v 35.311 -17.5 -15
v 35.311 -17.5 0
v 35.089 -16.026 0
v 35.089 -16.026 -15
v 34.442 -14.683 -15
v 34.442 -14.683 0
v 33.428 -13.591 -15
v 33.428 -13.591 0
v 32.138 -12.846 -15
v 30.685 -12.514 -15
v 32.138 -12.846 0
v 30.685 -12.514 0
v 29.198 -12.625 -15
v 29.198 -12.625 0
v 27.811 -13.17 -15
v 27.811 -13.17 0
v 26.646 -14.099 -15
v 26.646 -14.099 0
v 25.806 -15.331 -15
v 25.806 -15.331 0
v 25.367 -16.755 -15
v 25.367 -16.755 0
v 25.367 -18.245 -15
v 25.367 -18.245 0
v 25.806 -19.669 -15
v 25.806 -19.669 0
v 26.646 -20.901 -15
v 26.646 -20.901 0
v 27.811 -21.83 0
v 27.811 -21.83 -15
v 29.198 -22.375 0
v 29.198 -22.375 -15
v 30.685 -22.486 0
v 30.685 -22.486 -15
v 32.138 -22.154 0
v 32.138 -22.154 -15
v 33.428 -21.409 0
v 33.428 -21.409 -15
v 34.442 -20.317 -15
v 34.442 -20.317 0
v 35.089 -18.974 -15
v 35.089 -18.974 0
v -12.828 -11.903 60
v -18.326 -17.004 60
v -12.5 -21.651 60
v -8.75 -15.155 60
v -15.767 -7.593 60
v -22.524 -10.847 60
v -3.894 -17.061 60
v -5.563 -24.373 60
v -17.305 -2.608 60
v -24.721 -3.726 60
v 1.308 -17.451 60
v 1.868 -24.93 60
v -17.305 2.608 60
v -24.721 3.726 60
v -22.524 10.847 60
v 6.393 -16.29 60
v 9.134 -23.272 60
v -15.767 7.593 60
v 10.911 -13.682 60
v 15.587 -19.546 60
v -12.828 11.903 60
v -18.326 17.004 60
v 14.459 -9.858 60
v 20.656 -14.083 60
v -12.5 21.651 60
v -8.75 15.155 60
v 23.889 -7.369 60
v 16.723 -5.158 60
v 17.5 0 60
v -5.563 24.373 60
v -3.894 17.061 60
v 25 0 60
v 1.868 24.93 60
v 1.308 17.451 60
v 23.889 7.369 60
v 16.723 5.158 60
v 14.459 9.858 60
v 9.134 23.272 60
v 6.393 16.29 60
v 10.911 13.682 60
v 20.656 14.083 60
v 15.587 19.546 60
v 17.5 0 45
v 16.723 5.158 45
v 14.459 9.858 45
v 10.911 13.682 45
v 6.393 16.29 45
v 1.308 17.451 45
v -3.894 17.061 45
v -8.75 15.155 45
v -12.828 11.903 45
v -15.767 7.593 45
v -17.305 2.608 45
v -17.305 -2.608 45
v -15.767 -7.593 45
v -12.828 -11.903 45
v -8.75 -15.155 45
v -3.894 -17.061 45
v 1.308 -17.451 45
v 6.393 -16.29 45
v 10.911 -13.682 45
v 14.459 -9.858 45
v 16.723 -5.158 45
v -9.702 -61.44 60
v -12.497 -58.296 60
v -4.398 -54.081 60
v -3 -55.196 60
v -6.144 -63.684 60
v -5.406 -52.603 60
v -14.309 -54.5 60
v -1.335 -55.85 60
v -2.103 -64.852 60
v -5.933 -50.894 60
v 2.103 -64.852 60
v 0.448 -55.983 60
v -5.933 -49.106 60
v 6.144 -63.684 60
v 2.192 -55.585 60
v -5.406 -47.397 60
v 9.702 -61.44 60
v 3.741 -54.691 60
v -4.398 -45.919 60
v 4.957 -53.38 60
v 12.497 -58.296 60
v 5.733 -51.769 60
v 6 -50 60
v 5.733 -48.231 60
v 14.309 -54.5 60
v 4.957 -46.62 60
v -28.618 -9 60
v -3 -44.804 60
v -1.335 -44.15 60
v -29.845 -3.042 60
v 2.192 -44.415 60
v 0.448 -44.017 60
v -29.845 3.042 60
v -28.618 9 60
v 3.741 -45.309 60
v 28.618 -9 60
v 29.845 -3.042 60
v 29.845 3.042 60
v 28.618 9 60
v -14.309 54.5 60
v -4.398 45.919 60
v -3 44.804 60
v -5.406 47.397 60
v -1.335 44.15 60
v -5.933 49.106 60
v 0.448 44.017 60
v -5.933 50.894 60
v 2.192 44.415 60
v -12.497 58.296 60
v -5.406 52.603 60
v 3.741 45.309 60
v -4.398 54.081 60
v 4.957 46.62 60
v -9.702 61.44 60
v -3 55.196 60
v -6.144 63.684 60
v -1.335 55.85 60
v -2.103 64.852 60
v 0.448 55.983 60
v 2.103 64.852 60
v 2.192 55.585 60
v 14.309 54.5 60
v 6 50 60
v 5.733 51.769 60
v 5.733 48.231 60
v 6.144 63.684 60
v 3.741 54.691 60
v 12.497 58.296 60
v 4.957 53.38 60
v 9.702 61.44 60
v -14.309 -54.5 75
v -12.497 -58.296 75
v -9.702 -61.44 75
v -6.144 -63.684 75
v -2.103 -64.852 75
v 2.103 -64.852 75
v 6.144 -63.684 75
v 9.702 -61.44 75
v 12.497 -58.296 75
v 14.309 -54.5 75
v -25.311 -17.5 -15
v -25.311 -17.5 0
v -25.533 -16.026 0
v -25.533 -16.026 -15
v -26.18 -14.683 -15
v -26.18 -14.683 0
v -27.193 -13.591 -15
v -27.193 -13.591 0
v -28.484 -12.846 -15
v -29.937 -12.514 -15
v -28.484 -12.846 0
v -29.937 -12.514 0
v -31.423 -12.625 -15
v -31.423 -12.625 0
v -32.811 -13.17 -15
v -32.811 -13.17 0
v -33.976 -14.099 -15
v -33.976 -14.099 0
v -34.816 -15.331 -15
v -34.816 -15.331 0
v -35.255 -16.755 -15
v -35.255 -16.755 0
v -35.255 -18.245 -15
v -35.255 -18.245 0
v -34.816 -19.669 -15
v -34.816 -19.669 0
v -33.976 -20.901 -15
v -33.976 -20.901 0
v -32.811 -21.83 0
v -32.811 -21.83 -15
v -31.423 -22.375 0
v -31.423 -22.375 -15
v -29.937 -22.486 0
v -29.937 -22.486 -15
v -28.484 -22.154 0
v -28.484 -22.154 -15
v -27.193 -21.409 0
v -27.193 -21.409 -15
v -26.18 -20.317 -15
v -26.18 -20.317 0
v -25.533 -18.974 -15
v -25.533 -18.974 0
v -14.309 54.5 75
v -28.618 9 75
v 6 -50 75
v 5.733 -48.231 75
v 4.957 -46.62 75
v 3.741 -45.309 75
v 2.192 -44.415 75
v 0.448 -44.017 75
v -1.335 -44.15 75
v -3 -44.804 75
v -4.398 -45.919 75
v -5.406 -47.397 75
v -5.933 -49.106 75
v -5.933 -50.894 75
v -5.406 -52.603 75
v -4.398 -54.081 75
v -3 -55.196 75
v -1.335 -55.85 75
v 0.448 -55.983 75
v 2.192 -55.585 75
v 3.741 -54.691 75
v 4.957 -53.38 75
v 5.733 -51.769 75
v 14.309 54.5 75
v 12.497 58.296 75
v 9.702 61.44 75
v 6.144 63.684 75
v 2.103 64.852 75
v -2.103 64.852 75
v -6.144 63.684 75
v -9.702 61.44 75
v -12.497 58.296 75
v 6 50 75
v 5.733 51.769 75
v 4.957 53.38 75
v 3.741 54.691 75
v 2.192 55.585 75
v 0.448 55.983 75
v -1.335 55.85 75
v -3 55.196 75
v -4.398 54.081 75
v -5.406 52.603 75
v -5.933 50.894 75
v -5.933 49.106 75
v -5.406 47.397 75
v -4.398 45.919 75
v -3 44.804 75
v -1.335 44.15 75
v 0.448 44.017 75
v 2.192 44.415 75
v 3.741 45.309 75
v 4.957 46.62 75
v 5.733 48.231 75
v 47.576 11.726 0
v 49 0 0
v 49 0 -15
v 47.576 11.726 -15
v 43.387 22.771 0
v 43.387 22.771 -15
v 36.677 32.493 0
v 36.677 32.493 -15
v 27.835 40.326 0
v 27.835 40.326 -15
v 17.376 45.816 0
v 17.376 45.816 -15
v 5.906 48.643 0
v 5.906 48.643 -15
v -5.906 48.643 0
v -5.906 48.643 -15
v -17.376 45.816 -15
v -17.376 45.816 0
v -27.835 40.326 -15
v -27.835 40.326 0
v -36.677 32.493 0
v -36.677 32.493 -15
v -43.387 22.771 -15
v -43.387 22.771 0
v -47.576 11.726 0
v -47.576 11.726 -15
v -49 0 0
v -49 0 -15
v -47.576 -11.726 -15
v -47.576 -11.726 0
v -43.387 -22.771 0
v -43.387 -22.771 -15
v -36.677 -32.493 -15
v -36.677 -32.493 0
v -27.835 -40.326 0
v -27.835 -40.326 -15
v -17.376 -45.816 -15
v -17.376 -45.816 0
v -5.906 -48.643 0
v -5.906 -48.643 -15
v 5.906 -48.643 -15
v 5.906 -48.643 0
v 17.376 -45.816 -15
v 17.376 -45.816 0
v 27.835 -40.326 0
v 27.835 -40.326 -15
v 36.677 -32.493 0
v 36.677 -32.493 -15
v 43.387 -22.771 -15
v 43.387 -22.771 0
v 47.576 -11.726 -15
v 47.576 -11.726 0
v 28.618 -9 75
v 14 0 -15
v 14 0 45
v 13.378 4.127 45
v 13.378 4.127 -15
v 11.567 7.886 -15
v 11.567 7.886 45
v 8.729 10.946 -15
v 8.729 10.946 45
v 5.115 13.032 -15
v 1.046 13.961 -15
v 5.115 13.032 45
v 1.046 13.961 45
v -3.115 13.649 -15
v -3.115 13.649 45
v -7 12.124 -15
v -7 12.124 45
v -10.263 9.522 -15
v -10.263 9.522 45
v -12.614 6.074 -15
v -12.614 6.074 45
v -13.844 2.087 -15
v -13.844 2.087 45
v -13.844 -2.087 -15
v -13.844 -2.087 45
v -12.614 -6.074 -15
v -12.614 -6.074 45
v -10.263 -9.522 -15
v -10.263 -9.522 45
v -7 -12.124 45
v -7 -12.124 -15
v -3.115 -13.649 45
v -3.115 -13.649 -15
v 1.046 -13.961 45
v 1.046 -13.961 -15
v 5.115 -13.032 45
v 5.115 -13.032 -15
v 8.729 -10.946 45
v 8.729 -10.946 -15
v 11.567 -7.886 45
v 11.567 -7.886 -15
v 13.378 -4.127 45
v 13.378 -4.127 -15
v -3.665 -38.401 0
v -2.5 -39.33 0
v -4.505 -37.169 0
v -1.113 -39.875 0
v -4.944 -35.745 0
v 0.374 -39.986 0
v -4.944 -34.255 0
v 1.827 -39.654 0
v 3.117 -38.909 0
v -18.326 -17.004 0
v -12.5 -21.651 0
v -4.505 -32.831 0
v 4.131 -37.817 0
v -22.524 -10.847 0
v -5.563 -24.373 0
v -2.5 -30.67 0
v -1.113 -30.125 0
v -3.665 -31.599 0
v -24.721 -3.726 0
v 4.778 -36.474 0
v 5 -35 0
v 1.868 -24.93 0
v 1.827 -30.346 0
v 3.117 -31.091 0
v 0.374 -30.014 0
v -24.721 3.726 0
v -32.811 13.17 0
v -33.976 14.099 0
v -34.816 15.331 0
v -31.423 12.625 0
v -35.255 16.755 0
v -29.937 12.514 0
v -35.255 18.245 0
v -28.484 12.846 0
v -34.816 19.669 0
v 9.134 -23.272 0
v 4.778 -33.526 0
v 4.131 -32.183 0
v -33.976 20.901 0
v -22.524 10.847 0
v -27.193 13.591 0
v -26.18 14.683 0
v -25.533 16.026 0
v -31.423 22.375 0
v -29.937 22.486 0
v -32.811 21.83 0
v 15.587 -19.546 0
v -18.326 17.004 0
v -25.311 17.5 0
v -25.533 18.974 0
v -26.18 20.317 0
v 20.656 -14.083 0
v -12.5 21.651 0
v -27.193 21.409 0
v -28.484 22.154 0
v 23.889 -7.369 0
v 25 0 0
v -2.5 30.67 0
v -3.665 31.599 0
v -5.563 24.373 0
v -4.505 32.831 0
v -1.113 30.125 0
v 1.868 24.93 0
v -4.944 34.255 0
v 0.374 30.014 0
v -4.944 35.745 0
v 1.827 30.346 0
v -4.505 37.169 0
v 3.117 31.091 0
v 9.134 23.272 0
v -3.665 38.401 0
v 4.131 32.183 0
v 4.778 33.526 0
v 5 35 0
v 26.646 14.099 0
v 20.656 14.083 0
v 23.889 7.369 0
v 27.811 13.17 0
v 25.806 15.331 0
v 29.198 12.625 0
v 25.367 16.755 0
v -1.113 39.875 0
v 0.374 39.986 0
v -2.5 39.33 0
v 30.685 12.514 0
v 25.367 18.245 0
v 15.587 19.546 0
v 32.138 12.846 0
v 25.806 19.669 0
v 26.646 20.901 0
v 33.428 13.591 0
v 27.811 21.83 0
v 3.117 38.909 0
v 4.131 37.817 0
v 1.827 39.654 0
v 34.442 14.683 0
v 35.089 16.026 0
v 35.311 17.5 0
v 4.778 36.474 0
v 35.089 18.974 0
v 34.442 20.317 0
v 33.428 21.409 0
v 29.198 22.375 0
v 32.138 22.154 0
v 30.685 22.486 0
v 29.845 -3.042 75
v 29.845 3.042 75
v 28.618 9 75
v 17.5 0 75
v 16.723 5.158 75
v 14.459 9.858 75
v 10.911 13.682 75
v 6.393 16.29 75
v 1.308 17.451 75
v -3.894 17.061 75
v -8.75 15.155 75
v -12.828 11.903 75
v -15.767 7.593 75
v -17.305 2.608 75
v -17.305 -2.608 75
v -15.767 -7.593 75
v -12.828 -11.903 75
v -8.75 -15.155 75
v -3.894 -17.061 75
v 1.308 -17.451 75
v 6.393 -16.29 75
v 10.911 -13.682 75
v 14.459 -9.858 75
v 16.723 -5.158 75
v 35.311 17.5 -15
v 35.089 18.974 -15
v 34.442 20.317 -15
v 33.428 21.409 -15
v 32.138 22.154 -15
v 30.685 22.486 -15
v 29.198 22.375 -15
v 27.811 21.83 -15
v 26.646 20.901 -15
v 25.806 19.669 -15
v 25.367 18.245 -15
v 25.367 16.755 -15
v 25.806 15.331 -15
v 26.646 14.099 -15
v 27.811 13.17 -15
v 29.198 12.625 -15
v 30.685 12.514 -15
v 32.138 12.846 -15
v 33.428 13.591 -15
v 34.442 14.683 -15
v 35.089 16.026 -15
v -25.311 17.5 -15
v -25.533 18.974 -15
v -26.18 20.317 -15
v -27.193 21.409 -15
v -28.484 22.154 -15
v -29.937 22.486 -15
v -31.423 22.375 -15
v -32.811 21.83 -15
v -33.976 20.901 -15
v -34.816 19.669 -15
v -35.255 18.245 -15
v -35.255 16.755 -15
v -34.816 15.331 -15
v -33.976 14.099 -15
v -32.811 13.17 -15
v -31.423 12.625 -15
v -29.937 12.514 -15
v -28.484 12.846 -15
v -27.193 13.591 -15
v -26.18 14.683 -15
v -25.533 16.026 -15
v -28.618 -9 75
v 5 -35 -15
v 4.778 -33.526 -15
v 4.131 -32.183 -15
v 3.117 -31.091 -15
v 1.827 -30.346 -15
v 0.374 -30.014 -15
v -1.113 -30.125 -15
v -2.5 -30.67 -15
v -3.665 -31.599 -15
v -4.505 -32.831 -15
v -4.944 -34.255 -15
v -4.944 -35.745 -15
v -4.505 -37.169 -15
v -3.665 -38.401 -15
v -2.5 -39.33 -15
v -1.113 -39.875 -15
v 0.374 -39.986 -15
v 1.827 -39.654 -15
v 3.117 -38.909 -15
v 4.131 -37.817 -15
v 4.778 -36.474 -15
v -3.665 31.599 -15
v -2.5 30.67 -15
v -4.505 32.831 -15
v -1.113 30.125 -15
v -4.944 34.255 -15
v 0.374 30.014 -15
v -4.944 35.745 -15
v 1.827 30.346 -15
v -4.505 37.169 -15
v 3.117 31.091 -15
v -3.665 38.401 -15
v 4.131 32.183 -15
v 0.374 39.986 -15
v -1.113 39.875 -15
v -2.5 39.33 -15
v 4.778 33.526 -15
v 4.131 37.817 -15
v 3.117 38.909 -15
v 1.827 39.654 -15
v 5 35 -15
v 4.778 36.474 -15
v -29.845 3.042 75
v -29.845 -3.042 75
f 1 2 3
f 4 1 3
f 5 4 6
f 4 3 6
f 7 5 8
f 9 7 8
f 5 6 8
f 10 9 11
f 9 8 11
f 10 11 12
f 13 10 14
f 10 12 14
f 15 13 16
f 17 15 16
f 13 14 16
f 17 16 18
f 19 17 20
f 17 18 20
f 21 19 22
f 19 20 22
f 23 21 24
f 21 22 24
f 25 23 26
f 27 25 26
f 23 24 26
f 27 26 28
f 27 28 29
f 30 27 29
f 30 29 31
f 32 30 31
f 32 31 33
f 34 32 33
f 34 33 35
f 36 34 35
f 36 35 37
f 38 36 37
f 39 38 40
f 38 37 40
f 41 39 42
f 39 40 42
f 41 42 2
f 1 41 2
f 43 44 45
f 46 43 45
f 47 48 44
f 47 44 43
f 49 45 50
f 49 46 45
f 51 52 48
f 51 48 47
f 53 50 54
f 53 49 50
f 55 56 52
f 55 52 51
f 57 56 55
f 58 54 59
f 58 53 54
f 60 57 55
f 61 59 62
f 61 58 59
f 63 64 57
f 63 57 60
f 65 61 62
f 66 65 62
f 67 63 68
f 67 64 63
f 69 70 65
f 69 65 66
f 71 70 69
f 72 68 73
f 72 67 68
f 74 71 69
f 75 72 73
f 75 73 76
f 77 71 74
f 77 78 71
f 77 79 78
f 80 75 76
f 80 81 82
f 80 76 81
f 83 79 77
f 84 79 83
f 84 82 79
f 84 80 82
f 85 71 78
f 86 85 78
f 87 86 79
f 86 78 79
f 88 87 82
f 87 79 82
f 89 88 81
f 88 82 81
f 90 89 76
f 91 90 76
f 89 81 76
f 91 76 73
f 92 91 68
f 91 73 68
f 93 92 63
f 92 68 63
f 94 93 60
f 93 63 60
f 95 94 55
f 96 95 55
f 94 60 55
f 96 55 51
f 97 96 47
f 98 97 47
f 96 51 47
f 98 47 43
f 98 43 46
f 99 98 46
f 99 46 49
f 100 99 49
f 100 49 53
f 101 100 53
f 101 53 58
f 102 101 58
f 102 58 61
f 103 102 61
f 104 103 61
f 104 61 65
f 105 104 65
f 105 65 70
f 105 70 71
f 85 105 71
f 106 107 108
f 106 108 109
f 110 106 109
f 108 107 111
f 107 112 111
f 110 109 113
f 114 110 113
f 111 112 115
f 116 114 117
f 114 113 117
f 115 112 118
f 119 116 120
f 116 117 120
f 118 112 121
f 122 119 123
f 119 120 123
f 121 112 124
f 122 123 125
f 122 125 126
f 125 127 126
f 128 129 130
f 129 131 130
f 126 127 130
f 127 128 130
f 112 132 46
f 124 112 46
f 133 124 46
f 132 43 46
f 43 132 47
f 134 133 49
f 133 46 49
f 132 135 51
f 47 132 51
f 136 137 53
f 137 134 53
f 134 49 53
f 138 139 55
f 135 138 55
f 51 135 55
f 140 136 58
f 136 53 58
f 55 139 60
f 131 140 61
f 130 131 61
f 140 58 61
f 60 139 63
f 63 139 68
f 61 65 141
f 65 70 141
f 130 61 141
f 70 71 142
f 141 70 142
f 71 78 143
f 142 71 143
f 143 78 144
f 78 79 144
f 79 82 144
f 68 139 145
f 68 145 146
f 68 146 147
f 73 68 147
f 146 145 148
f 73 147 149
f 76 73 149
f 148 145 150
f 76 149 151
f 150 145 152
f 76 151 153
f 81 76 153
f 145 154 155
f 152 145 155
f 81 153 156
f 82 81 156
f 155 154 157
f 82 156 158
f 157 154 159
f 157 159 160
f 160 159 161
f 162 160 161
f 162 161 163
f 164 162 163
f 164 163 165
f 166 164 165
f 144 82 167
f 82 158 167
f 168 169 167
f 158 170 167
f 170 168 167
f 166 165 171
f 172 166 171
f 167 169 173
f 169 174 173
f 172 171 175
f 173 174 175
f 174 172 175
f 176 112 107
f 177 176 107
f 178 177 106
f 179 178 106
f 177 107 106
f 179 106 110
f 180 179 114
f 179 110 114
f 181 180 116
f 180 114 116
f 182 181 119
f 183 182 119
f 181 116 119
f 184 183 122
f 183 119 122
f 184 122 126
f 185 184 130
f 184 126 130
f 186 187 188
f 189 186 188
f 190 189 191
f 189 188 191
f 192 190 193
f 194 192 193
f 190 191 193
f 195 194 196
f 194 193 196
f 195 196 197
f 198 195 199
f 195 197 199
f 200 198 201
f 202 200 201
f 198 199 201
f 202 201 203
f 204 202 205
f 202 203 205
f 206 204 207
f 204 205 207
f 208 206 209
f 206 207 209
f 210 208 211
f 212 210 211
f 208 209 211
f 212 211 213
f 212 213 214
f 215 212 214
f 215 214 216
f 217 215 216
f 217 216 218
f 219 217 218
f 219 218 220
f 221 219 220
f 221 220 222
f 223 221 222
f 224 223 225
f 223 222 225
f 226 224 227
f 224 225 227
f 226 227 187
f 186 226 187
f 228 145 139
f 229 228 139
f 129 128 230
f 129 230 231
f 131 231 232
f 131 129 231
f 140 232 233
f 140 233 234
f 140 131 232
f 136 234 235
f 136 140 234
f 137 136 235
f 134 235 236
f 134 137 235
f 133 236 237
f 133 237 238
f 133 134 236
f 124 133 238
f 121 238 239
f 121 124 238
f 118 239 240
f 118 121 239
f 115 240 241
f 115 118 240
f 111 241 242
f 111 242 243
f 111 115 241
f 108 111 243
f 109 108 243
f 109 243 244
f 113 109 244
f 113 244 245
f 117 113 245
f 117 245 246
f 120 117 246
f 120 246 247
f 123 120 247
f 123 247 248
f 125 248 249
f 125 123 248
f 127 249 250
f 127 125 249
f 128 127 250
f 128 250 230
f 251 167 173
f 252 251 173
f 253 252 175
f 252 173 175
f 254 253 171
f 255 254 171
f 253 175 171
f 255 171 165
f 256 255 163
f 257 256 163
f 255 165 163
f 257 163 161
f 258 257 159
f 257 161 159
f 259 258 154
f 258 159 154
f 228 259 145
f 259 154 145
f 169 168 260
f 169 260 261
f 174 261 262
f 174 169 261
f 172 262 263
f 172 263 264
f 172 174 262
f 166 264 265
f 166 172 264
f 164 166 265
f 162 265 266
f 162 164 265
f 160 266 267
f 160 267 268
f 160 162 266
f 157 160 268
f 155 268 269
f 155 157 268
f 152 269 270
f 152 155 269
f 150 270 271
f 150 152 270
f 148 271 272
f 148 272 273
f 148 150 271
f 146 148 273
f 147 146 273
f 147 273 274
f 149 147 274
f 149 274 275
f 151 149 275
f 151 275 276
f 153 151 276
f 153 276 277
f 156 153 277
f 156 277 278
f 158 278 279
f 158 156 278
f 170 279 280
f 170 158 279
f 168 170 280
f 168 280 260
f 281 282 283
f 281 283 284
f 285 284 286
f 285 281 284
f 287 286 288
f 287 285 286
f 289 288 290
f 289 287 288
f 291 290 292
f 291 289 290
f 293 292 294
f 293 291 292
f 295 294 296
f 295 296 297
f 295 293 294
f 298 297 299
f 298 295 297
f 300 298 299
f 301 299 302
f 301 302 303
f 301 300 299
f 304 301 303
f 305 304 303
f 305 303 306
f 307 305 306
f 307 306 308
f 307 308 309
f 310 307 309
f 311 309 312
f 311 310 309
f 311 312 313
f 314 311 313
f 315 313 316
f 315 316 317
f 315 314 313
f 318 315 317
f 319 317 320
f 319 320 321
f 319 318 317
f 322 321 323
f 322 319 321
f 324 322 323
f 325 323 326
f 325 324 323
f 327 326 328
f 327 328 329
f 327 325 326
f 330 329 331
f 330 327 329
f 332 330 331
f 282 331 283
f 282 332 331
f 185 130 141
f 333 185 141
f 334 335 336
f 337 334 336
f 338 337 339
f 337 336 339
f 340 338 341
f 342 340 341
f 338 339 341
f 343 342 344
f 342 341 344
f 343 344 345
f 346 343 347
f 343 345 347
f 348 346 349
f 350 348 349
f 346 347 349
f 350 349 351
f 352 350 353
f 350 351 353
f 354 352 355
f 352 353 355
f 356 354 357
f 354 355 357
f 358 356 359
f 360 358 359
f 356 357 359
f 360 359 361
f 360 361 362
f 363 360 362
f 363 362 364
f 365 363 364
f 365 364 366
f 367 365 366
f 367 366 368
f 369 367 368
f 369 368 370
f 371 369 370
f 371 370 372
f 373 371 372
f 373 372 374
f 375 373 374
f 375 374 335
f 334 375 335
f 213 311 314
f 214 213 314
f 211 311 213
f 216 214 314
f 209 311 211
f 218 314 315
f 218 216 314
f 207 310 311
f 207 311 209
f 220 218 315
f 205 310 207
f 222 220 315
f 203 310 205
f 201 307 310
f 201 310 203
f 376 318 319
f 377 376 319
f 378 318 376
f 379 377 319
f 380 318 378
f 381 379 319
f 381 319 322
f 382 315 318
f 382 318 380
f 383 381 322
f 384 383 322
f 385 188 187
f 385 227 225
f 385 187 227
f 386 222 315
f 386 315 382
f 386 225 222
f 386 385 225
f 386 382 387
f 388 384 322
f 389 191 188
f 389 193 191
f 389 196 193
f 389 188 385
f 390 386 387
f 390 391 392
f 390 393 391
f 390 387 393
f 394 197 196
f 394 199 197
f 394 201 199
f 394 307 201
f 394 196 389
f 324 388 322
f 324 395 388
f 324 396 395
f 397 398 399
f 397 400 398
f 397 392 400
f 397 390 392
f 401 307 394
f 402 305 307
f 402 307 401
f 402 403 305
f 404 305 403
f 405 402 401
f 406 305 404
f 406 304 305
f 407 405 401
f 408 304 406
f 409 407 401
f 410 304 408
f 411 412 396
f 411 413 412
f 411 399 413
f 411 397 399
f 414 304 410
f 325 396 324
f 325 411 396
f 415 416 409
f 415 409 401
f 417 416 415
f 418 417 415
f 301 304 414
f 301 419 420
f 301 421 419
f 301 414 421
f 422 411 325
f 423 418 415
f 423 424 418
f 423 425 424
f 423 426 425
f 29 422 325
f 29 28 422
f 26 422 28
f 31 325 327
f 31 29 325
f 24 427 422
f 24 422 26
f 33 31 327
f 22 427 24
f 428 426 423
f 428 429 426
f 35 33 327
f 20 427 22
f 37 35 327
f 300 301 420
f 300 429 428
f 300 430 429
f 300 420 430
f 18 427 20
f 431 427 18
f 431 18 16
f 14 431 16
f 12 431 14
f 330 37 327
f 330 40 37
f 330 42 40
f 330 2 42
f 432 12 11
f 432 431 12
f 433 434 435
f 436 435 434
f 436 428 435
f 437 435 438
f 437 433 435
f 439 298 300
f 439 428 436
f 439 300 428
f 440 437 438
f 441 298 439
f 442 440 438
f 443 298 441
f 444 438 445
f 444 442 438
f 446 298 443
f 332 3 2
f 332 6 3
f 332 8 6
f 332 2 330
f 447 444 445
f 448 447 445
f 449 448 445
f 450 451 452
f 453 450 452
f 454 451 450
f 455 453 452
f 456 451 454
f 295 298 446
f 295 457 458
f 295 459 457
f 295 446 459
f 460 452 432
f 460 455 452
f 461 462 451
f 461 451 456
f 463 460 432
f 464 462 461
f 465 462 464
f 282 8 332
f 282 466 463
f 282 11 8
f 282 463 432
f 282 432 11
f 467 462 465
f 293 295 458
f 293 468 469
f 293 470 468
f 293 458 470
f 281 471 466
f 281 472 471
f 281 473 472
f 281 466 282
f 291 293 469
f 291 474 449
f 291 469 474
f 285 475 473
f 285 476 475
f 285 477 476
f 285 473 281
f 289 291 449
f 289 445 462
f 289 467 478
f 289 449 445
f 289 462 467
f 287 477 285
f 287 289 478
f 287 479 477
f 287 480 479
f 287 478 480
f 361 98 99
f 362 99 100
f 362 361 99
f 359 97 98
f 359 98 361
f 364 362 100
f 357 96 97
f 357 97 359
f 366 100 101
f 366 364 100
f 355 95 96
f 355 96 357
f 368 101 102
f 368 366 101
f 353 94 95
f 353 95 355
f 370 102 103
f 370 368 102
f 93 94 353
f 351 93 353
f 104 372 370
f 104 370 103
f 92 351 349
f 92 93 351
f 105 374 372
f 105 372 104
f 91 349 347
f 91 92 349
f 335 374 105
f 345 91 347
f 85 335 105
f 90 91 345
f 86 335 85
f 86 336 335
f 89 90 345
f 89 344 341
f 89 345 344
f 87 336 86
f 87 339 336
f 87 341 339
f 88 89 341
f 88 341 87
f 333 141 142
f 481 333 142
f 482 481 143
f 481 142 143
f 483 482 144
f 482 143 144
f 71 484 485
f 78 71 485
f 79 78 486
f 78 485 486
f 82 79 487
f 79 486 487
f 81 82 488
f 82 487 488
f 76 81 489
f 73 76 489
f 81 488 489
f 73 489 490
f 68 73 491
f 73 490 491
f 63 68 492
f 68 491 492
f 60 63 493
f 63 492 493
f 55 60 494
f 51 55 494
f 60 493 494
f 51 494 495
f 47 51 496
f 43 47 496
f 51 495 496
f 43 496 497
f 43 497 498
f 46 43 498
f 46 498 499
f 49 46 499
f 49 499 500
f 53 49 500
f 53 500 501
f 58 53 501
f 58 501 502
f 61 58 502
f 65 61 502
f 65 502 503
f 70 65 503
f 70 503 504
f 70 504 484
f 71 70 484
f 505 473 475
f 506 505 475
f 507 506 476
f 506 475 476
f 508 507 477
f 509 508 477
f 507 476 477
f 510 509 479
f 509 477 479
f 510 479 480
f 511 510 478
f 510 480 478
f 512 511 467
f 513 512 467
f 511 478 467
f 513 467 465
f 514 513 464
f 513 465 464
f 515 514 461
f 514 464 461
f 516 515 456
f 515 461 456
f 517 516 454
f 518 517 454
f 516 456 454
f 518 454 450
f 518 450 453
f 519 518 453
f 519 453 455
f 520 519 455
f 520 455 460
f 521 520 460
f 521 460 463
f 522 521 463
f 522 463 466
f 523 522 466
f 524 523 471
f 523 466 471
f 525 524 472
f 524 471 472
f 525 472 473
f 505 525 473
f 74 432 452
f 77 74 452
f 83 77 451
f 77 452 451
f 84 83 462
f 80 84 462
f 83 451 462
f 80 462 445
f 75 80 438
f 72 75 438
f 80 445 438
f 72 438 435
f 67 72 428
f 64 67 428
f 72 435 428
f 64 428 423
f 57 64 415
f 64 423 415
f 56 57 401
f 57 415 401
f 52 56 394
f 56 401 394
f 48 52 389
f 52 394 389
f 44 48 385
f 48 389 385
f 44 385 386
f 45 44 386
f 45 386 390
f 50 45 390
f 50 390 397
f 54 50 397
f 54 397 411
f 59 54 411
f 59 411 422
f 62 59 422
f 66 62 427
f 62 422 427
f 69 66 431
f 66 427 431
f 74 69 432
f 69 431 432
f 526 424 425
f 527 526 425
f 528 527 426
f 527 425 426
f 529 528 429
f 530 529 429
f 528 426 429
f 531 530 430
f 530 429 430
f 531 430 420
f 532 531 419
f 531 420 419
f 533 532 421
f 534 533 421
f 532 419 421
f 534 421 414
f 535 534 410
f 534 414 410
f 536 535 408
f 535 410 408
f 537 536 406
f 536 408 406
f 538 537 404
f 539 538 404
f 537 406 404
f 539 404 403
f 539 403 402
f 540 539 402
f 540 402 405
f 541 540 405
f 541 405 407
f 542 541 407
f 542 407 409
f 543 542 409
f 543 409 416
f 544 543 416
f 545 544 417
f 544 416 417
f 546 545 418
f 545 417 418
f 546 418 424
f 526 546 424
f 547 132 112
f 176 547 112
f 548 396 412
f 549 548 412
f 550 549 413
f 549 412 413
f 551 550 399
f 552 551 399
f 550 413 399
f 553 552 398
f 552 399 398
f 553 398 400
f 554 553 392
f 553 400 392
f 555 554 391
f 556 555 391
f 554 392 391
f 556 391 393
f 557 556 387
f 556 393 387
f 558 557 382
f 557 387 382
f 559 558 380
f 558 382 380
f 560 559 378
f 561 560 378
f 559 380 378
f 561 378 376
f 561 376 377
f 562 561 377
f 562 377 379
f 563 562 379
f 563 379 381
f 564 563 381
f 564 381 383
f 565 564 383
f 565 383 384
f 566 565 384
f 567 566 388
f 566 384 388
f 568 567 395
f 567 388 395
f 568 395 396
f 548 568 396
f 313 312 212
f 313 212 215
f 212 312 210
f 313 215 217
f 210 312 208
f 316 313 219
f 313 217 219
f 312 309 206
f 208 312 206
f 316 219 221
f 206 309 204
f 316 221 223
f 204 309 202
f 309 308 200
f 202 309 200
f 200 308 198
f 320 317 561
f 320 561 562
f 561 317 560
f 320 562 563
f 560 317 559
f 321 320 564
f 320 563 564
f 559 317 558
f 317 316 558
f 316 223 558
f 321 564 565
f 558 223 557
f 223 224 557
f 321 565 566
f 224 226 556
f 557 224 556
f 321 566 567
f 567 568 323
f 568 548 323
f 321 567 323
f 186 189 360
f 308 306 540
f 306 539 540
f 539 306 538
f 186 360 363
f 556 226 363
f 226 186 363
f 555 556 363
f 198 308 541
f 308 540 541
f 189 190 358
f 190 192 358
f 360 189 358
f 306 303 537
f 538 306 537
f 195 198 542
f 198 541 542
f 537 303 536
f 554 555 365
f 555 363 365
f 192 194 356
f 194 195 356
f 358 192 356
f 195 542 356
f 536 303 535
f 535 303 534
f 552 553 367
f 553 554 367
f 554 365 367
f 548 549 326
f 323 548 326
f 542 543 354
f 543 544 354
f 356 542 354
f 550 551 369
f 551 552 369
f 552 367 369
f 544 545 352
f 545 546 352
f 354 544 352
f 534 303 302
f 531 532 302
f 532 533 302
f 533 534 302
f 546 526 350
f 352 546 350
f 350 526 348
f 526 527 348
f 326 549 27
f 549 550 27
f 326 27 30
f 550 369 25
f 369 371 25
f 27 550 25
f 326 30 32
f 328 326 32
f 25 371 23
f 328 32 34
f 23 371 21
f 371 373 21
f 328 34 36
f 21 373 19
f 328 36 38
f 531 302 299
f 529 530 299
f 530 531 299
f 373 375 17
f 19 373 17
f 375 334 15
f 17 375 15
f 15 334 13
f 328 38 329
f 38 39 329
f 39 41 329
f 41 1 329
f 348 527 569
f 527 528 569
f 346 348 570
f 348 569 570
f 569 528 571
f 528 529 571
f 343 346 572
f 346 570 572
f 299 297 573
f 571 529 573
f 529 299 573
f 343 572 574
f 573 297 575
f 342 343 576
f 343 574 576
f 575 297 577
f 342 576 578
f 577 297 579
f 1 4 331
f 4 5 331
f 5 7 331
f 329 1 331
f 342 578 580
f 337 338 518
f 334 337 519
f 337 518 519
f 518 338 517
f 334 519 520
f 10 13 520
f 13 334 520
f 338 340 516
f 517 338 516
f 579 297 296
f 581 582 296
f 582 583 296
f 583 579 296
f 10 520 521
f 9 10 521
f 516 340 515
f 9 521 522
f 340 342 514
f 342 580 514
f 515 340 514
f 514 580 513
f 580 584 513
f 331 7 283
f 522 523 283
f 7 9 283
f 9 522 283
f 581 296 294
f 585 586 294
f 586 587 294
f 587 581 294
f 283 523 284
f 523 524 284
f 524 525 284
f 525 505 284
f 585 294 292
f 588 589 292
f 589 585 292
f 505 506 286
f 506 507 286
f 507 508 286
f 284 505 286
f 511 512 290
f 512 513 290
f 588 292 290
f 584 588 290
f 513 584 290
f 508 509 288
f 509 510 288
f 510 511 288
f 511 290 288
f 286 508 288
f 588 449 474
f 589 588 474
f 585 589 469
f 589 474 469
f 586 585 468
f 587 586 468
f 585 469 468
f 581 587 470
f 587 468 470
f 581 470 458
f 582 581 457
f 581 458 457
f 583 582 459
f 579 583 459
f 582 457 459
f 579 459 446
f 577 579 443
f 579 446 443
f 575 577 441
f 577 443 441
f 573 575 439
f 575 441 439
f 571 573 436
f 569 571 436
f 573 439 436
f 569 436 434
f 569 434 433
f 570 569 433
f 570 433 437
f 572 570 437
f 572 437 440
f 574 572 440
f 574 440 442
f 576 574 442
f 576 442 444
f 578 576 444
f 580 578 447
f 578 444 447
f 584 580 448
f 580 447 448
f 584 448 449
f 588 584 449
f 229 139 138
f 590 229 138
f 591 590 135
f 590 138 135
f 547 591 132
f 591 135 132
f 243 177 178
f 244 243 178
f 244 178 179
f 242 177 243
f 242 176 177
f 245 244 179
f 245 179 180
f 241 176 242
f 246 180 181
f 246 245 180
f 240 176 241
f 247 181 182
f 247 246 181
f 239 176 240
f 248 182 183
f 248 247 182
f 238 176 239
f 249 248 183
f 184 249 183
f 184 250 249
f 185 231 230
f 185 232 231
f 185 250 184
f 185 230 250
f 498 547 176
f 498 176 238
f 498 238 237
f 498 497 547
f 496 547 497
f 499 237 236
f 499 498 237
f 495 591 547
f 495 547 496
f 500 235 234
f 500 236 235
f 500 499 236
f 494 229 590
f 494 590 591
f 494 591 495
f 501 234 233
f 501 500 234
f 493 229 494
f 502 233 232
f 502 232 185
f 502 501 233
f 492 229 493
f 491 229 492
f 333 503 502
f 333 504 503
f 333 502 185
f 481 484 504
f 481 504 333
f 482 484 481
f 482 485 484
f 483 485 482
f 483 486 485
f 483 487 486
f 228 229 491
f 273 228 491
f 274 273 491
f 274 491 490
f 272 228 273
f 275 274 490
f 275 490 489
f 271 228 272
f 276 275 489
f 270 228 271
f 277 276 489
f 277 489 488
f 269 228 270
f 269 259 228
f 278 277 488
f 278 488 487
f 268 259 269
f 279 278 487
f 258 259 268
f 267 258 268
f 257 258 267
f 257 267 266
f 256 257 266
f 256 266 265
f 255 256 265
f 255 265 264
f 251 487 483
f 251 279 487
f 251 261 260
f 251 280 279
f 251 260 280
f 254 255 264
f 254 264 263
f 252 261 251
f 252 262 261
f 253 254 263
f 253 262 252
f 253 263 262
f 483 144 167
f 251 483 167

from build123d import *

# Parameters (mm, degrees)
SKETCH1_R           = 49
SKETCH1_R_2         = 5
BOSS_EXTRUDE1_DEPTH = 15
SKETCH1_3_R         = 25
BOSS_EXTRUDE2_DEPTH = 60
SKETCH2_R           = 6
BOSS_EXTRUDE3_DEPTH = 15
SKETCH3_R           = 17.5
CUT_EXTRUDE1_DEPTH  = 30
SKETCH4_R           = 14
CUT_EXTRUDE2_DEPTH  = 102.123686642


with BuildPart() as part:
    # Sketch1 → Boss-Extrude1 (new body)
    with BuildSketch(Plane.XY):
        Circle(SKETCH1_R)
        with Locations((-30.310889132, -17.5)):
            Circle(SKETCH1_R_2, mode=Mode.SUBTRACT)
        with Locations((0, -35)):
            Circle(SKETCH1_R_2, mode=Mode.SUBTRACT)
        with Locations((30.310889132, -17.5)):
            Circle(SKETCH1_R_2, mode=Mode.SUBTRACT)
        with Locations((-30.310889132, 17.5)):
            Circle(SKETCH1_R_2, mode=Mode.SUBTRACT)
        with Locations((30.310889132, 17.5)):
            Circle(SKETCH1_R_2, mode=Mode.SUBTRACT)
        with Locations((0, 35)):
            Circle(SKETCH1_R_2, mode=Mode.SUBTRACT)
    extrude(amount=-BOSS_EXTRUDE1_DEPTH)

    # Sketch1<3> → Boss-Extrude2 (add)
    with BuildSketch(Plane.XY):
        Circle(SKETCH1_3_R)
    extrude(amount=BOSS_EXTRUDE2_DEPTH)


with BuildPart() as body_2:
    # Sketch2 → Boss-Extrude3 (new body)
    with BuildSketch(Plane.XY.offset(60)):
        with BuildLine():
            Line((28.618176043, 9), (14.309088021, 54.5))
            ThreePointArc((14.309088021, 54.5), (0, 65), (-14.309088021, 54.5))
            Line((-14.309088021, 54.5), (-28.618176043, 9))
            ThreePointArc((-28.618176043, 9), (-30, 0), (-28.618176043, -9))
            Line((-28.618176043, -9), (-14.309088021, -54.5))
            ThreePointArc((-14.309088021, -54.5), (0, -65), (14.309088021, -54.5))
            Line((14.309088021, -54.5), (28.618176043, -9))
            ThreePointArc((28.618176043, -9), (30, 0), (28.618176043, 9))
        make_face()
        with Locations((0, 50)):
            Circle(SKETCH2_R, mode=Mode.SUBTRACT)
        with Locations((0, -50)):
            Circle(SKETCH2_R, mode=Mode.SUBTRACT)
    extrude(amount=BOSS_EXTRUDE3_DEPTH)


with BuildPart() as cut_extrude1_tool:
    # Sketch3 → Cut-Extrude1 (new body)
    with BuildSketch(Plane.XY.offset(75)):
        Circle(SKETCH3_R)
    extrude(amount=-CUT_EXTRUDE1_DEPTH)


with BuildPart() as part_1:
    add(part.part)

    # Cut-Extrude1: cut by cut_extrude1_tool
    add(cut_extrude1_tool.part, mode=Mode.SUBTRACT)

    # Sketch4 → Cut-Extrude2 (cut, through all)
    with BuildSketch(Plane.XY.offset(45)):
        Circle(SKETCH4_R)
    extrude(amount=-CUT_EXTRUDE2_DEPTH, mode=Mode.SUBTRACT)


with BuildPart() as body_2_1:
    add(body_2.part)

    # Cut-Extrude1: cut by cut_extrude1_tool
    add(cut_extrude1_tool.part, mode=Mode.SUBTRACT)


solid = Compound([part_1.part, body_2_1.part])
